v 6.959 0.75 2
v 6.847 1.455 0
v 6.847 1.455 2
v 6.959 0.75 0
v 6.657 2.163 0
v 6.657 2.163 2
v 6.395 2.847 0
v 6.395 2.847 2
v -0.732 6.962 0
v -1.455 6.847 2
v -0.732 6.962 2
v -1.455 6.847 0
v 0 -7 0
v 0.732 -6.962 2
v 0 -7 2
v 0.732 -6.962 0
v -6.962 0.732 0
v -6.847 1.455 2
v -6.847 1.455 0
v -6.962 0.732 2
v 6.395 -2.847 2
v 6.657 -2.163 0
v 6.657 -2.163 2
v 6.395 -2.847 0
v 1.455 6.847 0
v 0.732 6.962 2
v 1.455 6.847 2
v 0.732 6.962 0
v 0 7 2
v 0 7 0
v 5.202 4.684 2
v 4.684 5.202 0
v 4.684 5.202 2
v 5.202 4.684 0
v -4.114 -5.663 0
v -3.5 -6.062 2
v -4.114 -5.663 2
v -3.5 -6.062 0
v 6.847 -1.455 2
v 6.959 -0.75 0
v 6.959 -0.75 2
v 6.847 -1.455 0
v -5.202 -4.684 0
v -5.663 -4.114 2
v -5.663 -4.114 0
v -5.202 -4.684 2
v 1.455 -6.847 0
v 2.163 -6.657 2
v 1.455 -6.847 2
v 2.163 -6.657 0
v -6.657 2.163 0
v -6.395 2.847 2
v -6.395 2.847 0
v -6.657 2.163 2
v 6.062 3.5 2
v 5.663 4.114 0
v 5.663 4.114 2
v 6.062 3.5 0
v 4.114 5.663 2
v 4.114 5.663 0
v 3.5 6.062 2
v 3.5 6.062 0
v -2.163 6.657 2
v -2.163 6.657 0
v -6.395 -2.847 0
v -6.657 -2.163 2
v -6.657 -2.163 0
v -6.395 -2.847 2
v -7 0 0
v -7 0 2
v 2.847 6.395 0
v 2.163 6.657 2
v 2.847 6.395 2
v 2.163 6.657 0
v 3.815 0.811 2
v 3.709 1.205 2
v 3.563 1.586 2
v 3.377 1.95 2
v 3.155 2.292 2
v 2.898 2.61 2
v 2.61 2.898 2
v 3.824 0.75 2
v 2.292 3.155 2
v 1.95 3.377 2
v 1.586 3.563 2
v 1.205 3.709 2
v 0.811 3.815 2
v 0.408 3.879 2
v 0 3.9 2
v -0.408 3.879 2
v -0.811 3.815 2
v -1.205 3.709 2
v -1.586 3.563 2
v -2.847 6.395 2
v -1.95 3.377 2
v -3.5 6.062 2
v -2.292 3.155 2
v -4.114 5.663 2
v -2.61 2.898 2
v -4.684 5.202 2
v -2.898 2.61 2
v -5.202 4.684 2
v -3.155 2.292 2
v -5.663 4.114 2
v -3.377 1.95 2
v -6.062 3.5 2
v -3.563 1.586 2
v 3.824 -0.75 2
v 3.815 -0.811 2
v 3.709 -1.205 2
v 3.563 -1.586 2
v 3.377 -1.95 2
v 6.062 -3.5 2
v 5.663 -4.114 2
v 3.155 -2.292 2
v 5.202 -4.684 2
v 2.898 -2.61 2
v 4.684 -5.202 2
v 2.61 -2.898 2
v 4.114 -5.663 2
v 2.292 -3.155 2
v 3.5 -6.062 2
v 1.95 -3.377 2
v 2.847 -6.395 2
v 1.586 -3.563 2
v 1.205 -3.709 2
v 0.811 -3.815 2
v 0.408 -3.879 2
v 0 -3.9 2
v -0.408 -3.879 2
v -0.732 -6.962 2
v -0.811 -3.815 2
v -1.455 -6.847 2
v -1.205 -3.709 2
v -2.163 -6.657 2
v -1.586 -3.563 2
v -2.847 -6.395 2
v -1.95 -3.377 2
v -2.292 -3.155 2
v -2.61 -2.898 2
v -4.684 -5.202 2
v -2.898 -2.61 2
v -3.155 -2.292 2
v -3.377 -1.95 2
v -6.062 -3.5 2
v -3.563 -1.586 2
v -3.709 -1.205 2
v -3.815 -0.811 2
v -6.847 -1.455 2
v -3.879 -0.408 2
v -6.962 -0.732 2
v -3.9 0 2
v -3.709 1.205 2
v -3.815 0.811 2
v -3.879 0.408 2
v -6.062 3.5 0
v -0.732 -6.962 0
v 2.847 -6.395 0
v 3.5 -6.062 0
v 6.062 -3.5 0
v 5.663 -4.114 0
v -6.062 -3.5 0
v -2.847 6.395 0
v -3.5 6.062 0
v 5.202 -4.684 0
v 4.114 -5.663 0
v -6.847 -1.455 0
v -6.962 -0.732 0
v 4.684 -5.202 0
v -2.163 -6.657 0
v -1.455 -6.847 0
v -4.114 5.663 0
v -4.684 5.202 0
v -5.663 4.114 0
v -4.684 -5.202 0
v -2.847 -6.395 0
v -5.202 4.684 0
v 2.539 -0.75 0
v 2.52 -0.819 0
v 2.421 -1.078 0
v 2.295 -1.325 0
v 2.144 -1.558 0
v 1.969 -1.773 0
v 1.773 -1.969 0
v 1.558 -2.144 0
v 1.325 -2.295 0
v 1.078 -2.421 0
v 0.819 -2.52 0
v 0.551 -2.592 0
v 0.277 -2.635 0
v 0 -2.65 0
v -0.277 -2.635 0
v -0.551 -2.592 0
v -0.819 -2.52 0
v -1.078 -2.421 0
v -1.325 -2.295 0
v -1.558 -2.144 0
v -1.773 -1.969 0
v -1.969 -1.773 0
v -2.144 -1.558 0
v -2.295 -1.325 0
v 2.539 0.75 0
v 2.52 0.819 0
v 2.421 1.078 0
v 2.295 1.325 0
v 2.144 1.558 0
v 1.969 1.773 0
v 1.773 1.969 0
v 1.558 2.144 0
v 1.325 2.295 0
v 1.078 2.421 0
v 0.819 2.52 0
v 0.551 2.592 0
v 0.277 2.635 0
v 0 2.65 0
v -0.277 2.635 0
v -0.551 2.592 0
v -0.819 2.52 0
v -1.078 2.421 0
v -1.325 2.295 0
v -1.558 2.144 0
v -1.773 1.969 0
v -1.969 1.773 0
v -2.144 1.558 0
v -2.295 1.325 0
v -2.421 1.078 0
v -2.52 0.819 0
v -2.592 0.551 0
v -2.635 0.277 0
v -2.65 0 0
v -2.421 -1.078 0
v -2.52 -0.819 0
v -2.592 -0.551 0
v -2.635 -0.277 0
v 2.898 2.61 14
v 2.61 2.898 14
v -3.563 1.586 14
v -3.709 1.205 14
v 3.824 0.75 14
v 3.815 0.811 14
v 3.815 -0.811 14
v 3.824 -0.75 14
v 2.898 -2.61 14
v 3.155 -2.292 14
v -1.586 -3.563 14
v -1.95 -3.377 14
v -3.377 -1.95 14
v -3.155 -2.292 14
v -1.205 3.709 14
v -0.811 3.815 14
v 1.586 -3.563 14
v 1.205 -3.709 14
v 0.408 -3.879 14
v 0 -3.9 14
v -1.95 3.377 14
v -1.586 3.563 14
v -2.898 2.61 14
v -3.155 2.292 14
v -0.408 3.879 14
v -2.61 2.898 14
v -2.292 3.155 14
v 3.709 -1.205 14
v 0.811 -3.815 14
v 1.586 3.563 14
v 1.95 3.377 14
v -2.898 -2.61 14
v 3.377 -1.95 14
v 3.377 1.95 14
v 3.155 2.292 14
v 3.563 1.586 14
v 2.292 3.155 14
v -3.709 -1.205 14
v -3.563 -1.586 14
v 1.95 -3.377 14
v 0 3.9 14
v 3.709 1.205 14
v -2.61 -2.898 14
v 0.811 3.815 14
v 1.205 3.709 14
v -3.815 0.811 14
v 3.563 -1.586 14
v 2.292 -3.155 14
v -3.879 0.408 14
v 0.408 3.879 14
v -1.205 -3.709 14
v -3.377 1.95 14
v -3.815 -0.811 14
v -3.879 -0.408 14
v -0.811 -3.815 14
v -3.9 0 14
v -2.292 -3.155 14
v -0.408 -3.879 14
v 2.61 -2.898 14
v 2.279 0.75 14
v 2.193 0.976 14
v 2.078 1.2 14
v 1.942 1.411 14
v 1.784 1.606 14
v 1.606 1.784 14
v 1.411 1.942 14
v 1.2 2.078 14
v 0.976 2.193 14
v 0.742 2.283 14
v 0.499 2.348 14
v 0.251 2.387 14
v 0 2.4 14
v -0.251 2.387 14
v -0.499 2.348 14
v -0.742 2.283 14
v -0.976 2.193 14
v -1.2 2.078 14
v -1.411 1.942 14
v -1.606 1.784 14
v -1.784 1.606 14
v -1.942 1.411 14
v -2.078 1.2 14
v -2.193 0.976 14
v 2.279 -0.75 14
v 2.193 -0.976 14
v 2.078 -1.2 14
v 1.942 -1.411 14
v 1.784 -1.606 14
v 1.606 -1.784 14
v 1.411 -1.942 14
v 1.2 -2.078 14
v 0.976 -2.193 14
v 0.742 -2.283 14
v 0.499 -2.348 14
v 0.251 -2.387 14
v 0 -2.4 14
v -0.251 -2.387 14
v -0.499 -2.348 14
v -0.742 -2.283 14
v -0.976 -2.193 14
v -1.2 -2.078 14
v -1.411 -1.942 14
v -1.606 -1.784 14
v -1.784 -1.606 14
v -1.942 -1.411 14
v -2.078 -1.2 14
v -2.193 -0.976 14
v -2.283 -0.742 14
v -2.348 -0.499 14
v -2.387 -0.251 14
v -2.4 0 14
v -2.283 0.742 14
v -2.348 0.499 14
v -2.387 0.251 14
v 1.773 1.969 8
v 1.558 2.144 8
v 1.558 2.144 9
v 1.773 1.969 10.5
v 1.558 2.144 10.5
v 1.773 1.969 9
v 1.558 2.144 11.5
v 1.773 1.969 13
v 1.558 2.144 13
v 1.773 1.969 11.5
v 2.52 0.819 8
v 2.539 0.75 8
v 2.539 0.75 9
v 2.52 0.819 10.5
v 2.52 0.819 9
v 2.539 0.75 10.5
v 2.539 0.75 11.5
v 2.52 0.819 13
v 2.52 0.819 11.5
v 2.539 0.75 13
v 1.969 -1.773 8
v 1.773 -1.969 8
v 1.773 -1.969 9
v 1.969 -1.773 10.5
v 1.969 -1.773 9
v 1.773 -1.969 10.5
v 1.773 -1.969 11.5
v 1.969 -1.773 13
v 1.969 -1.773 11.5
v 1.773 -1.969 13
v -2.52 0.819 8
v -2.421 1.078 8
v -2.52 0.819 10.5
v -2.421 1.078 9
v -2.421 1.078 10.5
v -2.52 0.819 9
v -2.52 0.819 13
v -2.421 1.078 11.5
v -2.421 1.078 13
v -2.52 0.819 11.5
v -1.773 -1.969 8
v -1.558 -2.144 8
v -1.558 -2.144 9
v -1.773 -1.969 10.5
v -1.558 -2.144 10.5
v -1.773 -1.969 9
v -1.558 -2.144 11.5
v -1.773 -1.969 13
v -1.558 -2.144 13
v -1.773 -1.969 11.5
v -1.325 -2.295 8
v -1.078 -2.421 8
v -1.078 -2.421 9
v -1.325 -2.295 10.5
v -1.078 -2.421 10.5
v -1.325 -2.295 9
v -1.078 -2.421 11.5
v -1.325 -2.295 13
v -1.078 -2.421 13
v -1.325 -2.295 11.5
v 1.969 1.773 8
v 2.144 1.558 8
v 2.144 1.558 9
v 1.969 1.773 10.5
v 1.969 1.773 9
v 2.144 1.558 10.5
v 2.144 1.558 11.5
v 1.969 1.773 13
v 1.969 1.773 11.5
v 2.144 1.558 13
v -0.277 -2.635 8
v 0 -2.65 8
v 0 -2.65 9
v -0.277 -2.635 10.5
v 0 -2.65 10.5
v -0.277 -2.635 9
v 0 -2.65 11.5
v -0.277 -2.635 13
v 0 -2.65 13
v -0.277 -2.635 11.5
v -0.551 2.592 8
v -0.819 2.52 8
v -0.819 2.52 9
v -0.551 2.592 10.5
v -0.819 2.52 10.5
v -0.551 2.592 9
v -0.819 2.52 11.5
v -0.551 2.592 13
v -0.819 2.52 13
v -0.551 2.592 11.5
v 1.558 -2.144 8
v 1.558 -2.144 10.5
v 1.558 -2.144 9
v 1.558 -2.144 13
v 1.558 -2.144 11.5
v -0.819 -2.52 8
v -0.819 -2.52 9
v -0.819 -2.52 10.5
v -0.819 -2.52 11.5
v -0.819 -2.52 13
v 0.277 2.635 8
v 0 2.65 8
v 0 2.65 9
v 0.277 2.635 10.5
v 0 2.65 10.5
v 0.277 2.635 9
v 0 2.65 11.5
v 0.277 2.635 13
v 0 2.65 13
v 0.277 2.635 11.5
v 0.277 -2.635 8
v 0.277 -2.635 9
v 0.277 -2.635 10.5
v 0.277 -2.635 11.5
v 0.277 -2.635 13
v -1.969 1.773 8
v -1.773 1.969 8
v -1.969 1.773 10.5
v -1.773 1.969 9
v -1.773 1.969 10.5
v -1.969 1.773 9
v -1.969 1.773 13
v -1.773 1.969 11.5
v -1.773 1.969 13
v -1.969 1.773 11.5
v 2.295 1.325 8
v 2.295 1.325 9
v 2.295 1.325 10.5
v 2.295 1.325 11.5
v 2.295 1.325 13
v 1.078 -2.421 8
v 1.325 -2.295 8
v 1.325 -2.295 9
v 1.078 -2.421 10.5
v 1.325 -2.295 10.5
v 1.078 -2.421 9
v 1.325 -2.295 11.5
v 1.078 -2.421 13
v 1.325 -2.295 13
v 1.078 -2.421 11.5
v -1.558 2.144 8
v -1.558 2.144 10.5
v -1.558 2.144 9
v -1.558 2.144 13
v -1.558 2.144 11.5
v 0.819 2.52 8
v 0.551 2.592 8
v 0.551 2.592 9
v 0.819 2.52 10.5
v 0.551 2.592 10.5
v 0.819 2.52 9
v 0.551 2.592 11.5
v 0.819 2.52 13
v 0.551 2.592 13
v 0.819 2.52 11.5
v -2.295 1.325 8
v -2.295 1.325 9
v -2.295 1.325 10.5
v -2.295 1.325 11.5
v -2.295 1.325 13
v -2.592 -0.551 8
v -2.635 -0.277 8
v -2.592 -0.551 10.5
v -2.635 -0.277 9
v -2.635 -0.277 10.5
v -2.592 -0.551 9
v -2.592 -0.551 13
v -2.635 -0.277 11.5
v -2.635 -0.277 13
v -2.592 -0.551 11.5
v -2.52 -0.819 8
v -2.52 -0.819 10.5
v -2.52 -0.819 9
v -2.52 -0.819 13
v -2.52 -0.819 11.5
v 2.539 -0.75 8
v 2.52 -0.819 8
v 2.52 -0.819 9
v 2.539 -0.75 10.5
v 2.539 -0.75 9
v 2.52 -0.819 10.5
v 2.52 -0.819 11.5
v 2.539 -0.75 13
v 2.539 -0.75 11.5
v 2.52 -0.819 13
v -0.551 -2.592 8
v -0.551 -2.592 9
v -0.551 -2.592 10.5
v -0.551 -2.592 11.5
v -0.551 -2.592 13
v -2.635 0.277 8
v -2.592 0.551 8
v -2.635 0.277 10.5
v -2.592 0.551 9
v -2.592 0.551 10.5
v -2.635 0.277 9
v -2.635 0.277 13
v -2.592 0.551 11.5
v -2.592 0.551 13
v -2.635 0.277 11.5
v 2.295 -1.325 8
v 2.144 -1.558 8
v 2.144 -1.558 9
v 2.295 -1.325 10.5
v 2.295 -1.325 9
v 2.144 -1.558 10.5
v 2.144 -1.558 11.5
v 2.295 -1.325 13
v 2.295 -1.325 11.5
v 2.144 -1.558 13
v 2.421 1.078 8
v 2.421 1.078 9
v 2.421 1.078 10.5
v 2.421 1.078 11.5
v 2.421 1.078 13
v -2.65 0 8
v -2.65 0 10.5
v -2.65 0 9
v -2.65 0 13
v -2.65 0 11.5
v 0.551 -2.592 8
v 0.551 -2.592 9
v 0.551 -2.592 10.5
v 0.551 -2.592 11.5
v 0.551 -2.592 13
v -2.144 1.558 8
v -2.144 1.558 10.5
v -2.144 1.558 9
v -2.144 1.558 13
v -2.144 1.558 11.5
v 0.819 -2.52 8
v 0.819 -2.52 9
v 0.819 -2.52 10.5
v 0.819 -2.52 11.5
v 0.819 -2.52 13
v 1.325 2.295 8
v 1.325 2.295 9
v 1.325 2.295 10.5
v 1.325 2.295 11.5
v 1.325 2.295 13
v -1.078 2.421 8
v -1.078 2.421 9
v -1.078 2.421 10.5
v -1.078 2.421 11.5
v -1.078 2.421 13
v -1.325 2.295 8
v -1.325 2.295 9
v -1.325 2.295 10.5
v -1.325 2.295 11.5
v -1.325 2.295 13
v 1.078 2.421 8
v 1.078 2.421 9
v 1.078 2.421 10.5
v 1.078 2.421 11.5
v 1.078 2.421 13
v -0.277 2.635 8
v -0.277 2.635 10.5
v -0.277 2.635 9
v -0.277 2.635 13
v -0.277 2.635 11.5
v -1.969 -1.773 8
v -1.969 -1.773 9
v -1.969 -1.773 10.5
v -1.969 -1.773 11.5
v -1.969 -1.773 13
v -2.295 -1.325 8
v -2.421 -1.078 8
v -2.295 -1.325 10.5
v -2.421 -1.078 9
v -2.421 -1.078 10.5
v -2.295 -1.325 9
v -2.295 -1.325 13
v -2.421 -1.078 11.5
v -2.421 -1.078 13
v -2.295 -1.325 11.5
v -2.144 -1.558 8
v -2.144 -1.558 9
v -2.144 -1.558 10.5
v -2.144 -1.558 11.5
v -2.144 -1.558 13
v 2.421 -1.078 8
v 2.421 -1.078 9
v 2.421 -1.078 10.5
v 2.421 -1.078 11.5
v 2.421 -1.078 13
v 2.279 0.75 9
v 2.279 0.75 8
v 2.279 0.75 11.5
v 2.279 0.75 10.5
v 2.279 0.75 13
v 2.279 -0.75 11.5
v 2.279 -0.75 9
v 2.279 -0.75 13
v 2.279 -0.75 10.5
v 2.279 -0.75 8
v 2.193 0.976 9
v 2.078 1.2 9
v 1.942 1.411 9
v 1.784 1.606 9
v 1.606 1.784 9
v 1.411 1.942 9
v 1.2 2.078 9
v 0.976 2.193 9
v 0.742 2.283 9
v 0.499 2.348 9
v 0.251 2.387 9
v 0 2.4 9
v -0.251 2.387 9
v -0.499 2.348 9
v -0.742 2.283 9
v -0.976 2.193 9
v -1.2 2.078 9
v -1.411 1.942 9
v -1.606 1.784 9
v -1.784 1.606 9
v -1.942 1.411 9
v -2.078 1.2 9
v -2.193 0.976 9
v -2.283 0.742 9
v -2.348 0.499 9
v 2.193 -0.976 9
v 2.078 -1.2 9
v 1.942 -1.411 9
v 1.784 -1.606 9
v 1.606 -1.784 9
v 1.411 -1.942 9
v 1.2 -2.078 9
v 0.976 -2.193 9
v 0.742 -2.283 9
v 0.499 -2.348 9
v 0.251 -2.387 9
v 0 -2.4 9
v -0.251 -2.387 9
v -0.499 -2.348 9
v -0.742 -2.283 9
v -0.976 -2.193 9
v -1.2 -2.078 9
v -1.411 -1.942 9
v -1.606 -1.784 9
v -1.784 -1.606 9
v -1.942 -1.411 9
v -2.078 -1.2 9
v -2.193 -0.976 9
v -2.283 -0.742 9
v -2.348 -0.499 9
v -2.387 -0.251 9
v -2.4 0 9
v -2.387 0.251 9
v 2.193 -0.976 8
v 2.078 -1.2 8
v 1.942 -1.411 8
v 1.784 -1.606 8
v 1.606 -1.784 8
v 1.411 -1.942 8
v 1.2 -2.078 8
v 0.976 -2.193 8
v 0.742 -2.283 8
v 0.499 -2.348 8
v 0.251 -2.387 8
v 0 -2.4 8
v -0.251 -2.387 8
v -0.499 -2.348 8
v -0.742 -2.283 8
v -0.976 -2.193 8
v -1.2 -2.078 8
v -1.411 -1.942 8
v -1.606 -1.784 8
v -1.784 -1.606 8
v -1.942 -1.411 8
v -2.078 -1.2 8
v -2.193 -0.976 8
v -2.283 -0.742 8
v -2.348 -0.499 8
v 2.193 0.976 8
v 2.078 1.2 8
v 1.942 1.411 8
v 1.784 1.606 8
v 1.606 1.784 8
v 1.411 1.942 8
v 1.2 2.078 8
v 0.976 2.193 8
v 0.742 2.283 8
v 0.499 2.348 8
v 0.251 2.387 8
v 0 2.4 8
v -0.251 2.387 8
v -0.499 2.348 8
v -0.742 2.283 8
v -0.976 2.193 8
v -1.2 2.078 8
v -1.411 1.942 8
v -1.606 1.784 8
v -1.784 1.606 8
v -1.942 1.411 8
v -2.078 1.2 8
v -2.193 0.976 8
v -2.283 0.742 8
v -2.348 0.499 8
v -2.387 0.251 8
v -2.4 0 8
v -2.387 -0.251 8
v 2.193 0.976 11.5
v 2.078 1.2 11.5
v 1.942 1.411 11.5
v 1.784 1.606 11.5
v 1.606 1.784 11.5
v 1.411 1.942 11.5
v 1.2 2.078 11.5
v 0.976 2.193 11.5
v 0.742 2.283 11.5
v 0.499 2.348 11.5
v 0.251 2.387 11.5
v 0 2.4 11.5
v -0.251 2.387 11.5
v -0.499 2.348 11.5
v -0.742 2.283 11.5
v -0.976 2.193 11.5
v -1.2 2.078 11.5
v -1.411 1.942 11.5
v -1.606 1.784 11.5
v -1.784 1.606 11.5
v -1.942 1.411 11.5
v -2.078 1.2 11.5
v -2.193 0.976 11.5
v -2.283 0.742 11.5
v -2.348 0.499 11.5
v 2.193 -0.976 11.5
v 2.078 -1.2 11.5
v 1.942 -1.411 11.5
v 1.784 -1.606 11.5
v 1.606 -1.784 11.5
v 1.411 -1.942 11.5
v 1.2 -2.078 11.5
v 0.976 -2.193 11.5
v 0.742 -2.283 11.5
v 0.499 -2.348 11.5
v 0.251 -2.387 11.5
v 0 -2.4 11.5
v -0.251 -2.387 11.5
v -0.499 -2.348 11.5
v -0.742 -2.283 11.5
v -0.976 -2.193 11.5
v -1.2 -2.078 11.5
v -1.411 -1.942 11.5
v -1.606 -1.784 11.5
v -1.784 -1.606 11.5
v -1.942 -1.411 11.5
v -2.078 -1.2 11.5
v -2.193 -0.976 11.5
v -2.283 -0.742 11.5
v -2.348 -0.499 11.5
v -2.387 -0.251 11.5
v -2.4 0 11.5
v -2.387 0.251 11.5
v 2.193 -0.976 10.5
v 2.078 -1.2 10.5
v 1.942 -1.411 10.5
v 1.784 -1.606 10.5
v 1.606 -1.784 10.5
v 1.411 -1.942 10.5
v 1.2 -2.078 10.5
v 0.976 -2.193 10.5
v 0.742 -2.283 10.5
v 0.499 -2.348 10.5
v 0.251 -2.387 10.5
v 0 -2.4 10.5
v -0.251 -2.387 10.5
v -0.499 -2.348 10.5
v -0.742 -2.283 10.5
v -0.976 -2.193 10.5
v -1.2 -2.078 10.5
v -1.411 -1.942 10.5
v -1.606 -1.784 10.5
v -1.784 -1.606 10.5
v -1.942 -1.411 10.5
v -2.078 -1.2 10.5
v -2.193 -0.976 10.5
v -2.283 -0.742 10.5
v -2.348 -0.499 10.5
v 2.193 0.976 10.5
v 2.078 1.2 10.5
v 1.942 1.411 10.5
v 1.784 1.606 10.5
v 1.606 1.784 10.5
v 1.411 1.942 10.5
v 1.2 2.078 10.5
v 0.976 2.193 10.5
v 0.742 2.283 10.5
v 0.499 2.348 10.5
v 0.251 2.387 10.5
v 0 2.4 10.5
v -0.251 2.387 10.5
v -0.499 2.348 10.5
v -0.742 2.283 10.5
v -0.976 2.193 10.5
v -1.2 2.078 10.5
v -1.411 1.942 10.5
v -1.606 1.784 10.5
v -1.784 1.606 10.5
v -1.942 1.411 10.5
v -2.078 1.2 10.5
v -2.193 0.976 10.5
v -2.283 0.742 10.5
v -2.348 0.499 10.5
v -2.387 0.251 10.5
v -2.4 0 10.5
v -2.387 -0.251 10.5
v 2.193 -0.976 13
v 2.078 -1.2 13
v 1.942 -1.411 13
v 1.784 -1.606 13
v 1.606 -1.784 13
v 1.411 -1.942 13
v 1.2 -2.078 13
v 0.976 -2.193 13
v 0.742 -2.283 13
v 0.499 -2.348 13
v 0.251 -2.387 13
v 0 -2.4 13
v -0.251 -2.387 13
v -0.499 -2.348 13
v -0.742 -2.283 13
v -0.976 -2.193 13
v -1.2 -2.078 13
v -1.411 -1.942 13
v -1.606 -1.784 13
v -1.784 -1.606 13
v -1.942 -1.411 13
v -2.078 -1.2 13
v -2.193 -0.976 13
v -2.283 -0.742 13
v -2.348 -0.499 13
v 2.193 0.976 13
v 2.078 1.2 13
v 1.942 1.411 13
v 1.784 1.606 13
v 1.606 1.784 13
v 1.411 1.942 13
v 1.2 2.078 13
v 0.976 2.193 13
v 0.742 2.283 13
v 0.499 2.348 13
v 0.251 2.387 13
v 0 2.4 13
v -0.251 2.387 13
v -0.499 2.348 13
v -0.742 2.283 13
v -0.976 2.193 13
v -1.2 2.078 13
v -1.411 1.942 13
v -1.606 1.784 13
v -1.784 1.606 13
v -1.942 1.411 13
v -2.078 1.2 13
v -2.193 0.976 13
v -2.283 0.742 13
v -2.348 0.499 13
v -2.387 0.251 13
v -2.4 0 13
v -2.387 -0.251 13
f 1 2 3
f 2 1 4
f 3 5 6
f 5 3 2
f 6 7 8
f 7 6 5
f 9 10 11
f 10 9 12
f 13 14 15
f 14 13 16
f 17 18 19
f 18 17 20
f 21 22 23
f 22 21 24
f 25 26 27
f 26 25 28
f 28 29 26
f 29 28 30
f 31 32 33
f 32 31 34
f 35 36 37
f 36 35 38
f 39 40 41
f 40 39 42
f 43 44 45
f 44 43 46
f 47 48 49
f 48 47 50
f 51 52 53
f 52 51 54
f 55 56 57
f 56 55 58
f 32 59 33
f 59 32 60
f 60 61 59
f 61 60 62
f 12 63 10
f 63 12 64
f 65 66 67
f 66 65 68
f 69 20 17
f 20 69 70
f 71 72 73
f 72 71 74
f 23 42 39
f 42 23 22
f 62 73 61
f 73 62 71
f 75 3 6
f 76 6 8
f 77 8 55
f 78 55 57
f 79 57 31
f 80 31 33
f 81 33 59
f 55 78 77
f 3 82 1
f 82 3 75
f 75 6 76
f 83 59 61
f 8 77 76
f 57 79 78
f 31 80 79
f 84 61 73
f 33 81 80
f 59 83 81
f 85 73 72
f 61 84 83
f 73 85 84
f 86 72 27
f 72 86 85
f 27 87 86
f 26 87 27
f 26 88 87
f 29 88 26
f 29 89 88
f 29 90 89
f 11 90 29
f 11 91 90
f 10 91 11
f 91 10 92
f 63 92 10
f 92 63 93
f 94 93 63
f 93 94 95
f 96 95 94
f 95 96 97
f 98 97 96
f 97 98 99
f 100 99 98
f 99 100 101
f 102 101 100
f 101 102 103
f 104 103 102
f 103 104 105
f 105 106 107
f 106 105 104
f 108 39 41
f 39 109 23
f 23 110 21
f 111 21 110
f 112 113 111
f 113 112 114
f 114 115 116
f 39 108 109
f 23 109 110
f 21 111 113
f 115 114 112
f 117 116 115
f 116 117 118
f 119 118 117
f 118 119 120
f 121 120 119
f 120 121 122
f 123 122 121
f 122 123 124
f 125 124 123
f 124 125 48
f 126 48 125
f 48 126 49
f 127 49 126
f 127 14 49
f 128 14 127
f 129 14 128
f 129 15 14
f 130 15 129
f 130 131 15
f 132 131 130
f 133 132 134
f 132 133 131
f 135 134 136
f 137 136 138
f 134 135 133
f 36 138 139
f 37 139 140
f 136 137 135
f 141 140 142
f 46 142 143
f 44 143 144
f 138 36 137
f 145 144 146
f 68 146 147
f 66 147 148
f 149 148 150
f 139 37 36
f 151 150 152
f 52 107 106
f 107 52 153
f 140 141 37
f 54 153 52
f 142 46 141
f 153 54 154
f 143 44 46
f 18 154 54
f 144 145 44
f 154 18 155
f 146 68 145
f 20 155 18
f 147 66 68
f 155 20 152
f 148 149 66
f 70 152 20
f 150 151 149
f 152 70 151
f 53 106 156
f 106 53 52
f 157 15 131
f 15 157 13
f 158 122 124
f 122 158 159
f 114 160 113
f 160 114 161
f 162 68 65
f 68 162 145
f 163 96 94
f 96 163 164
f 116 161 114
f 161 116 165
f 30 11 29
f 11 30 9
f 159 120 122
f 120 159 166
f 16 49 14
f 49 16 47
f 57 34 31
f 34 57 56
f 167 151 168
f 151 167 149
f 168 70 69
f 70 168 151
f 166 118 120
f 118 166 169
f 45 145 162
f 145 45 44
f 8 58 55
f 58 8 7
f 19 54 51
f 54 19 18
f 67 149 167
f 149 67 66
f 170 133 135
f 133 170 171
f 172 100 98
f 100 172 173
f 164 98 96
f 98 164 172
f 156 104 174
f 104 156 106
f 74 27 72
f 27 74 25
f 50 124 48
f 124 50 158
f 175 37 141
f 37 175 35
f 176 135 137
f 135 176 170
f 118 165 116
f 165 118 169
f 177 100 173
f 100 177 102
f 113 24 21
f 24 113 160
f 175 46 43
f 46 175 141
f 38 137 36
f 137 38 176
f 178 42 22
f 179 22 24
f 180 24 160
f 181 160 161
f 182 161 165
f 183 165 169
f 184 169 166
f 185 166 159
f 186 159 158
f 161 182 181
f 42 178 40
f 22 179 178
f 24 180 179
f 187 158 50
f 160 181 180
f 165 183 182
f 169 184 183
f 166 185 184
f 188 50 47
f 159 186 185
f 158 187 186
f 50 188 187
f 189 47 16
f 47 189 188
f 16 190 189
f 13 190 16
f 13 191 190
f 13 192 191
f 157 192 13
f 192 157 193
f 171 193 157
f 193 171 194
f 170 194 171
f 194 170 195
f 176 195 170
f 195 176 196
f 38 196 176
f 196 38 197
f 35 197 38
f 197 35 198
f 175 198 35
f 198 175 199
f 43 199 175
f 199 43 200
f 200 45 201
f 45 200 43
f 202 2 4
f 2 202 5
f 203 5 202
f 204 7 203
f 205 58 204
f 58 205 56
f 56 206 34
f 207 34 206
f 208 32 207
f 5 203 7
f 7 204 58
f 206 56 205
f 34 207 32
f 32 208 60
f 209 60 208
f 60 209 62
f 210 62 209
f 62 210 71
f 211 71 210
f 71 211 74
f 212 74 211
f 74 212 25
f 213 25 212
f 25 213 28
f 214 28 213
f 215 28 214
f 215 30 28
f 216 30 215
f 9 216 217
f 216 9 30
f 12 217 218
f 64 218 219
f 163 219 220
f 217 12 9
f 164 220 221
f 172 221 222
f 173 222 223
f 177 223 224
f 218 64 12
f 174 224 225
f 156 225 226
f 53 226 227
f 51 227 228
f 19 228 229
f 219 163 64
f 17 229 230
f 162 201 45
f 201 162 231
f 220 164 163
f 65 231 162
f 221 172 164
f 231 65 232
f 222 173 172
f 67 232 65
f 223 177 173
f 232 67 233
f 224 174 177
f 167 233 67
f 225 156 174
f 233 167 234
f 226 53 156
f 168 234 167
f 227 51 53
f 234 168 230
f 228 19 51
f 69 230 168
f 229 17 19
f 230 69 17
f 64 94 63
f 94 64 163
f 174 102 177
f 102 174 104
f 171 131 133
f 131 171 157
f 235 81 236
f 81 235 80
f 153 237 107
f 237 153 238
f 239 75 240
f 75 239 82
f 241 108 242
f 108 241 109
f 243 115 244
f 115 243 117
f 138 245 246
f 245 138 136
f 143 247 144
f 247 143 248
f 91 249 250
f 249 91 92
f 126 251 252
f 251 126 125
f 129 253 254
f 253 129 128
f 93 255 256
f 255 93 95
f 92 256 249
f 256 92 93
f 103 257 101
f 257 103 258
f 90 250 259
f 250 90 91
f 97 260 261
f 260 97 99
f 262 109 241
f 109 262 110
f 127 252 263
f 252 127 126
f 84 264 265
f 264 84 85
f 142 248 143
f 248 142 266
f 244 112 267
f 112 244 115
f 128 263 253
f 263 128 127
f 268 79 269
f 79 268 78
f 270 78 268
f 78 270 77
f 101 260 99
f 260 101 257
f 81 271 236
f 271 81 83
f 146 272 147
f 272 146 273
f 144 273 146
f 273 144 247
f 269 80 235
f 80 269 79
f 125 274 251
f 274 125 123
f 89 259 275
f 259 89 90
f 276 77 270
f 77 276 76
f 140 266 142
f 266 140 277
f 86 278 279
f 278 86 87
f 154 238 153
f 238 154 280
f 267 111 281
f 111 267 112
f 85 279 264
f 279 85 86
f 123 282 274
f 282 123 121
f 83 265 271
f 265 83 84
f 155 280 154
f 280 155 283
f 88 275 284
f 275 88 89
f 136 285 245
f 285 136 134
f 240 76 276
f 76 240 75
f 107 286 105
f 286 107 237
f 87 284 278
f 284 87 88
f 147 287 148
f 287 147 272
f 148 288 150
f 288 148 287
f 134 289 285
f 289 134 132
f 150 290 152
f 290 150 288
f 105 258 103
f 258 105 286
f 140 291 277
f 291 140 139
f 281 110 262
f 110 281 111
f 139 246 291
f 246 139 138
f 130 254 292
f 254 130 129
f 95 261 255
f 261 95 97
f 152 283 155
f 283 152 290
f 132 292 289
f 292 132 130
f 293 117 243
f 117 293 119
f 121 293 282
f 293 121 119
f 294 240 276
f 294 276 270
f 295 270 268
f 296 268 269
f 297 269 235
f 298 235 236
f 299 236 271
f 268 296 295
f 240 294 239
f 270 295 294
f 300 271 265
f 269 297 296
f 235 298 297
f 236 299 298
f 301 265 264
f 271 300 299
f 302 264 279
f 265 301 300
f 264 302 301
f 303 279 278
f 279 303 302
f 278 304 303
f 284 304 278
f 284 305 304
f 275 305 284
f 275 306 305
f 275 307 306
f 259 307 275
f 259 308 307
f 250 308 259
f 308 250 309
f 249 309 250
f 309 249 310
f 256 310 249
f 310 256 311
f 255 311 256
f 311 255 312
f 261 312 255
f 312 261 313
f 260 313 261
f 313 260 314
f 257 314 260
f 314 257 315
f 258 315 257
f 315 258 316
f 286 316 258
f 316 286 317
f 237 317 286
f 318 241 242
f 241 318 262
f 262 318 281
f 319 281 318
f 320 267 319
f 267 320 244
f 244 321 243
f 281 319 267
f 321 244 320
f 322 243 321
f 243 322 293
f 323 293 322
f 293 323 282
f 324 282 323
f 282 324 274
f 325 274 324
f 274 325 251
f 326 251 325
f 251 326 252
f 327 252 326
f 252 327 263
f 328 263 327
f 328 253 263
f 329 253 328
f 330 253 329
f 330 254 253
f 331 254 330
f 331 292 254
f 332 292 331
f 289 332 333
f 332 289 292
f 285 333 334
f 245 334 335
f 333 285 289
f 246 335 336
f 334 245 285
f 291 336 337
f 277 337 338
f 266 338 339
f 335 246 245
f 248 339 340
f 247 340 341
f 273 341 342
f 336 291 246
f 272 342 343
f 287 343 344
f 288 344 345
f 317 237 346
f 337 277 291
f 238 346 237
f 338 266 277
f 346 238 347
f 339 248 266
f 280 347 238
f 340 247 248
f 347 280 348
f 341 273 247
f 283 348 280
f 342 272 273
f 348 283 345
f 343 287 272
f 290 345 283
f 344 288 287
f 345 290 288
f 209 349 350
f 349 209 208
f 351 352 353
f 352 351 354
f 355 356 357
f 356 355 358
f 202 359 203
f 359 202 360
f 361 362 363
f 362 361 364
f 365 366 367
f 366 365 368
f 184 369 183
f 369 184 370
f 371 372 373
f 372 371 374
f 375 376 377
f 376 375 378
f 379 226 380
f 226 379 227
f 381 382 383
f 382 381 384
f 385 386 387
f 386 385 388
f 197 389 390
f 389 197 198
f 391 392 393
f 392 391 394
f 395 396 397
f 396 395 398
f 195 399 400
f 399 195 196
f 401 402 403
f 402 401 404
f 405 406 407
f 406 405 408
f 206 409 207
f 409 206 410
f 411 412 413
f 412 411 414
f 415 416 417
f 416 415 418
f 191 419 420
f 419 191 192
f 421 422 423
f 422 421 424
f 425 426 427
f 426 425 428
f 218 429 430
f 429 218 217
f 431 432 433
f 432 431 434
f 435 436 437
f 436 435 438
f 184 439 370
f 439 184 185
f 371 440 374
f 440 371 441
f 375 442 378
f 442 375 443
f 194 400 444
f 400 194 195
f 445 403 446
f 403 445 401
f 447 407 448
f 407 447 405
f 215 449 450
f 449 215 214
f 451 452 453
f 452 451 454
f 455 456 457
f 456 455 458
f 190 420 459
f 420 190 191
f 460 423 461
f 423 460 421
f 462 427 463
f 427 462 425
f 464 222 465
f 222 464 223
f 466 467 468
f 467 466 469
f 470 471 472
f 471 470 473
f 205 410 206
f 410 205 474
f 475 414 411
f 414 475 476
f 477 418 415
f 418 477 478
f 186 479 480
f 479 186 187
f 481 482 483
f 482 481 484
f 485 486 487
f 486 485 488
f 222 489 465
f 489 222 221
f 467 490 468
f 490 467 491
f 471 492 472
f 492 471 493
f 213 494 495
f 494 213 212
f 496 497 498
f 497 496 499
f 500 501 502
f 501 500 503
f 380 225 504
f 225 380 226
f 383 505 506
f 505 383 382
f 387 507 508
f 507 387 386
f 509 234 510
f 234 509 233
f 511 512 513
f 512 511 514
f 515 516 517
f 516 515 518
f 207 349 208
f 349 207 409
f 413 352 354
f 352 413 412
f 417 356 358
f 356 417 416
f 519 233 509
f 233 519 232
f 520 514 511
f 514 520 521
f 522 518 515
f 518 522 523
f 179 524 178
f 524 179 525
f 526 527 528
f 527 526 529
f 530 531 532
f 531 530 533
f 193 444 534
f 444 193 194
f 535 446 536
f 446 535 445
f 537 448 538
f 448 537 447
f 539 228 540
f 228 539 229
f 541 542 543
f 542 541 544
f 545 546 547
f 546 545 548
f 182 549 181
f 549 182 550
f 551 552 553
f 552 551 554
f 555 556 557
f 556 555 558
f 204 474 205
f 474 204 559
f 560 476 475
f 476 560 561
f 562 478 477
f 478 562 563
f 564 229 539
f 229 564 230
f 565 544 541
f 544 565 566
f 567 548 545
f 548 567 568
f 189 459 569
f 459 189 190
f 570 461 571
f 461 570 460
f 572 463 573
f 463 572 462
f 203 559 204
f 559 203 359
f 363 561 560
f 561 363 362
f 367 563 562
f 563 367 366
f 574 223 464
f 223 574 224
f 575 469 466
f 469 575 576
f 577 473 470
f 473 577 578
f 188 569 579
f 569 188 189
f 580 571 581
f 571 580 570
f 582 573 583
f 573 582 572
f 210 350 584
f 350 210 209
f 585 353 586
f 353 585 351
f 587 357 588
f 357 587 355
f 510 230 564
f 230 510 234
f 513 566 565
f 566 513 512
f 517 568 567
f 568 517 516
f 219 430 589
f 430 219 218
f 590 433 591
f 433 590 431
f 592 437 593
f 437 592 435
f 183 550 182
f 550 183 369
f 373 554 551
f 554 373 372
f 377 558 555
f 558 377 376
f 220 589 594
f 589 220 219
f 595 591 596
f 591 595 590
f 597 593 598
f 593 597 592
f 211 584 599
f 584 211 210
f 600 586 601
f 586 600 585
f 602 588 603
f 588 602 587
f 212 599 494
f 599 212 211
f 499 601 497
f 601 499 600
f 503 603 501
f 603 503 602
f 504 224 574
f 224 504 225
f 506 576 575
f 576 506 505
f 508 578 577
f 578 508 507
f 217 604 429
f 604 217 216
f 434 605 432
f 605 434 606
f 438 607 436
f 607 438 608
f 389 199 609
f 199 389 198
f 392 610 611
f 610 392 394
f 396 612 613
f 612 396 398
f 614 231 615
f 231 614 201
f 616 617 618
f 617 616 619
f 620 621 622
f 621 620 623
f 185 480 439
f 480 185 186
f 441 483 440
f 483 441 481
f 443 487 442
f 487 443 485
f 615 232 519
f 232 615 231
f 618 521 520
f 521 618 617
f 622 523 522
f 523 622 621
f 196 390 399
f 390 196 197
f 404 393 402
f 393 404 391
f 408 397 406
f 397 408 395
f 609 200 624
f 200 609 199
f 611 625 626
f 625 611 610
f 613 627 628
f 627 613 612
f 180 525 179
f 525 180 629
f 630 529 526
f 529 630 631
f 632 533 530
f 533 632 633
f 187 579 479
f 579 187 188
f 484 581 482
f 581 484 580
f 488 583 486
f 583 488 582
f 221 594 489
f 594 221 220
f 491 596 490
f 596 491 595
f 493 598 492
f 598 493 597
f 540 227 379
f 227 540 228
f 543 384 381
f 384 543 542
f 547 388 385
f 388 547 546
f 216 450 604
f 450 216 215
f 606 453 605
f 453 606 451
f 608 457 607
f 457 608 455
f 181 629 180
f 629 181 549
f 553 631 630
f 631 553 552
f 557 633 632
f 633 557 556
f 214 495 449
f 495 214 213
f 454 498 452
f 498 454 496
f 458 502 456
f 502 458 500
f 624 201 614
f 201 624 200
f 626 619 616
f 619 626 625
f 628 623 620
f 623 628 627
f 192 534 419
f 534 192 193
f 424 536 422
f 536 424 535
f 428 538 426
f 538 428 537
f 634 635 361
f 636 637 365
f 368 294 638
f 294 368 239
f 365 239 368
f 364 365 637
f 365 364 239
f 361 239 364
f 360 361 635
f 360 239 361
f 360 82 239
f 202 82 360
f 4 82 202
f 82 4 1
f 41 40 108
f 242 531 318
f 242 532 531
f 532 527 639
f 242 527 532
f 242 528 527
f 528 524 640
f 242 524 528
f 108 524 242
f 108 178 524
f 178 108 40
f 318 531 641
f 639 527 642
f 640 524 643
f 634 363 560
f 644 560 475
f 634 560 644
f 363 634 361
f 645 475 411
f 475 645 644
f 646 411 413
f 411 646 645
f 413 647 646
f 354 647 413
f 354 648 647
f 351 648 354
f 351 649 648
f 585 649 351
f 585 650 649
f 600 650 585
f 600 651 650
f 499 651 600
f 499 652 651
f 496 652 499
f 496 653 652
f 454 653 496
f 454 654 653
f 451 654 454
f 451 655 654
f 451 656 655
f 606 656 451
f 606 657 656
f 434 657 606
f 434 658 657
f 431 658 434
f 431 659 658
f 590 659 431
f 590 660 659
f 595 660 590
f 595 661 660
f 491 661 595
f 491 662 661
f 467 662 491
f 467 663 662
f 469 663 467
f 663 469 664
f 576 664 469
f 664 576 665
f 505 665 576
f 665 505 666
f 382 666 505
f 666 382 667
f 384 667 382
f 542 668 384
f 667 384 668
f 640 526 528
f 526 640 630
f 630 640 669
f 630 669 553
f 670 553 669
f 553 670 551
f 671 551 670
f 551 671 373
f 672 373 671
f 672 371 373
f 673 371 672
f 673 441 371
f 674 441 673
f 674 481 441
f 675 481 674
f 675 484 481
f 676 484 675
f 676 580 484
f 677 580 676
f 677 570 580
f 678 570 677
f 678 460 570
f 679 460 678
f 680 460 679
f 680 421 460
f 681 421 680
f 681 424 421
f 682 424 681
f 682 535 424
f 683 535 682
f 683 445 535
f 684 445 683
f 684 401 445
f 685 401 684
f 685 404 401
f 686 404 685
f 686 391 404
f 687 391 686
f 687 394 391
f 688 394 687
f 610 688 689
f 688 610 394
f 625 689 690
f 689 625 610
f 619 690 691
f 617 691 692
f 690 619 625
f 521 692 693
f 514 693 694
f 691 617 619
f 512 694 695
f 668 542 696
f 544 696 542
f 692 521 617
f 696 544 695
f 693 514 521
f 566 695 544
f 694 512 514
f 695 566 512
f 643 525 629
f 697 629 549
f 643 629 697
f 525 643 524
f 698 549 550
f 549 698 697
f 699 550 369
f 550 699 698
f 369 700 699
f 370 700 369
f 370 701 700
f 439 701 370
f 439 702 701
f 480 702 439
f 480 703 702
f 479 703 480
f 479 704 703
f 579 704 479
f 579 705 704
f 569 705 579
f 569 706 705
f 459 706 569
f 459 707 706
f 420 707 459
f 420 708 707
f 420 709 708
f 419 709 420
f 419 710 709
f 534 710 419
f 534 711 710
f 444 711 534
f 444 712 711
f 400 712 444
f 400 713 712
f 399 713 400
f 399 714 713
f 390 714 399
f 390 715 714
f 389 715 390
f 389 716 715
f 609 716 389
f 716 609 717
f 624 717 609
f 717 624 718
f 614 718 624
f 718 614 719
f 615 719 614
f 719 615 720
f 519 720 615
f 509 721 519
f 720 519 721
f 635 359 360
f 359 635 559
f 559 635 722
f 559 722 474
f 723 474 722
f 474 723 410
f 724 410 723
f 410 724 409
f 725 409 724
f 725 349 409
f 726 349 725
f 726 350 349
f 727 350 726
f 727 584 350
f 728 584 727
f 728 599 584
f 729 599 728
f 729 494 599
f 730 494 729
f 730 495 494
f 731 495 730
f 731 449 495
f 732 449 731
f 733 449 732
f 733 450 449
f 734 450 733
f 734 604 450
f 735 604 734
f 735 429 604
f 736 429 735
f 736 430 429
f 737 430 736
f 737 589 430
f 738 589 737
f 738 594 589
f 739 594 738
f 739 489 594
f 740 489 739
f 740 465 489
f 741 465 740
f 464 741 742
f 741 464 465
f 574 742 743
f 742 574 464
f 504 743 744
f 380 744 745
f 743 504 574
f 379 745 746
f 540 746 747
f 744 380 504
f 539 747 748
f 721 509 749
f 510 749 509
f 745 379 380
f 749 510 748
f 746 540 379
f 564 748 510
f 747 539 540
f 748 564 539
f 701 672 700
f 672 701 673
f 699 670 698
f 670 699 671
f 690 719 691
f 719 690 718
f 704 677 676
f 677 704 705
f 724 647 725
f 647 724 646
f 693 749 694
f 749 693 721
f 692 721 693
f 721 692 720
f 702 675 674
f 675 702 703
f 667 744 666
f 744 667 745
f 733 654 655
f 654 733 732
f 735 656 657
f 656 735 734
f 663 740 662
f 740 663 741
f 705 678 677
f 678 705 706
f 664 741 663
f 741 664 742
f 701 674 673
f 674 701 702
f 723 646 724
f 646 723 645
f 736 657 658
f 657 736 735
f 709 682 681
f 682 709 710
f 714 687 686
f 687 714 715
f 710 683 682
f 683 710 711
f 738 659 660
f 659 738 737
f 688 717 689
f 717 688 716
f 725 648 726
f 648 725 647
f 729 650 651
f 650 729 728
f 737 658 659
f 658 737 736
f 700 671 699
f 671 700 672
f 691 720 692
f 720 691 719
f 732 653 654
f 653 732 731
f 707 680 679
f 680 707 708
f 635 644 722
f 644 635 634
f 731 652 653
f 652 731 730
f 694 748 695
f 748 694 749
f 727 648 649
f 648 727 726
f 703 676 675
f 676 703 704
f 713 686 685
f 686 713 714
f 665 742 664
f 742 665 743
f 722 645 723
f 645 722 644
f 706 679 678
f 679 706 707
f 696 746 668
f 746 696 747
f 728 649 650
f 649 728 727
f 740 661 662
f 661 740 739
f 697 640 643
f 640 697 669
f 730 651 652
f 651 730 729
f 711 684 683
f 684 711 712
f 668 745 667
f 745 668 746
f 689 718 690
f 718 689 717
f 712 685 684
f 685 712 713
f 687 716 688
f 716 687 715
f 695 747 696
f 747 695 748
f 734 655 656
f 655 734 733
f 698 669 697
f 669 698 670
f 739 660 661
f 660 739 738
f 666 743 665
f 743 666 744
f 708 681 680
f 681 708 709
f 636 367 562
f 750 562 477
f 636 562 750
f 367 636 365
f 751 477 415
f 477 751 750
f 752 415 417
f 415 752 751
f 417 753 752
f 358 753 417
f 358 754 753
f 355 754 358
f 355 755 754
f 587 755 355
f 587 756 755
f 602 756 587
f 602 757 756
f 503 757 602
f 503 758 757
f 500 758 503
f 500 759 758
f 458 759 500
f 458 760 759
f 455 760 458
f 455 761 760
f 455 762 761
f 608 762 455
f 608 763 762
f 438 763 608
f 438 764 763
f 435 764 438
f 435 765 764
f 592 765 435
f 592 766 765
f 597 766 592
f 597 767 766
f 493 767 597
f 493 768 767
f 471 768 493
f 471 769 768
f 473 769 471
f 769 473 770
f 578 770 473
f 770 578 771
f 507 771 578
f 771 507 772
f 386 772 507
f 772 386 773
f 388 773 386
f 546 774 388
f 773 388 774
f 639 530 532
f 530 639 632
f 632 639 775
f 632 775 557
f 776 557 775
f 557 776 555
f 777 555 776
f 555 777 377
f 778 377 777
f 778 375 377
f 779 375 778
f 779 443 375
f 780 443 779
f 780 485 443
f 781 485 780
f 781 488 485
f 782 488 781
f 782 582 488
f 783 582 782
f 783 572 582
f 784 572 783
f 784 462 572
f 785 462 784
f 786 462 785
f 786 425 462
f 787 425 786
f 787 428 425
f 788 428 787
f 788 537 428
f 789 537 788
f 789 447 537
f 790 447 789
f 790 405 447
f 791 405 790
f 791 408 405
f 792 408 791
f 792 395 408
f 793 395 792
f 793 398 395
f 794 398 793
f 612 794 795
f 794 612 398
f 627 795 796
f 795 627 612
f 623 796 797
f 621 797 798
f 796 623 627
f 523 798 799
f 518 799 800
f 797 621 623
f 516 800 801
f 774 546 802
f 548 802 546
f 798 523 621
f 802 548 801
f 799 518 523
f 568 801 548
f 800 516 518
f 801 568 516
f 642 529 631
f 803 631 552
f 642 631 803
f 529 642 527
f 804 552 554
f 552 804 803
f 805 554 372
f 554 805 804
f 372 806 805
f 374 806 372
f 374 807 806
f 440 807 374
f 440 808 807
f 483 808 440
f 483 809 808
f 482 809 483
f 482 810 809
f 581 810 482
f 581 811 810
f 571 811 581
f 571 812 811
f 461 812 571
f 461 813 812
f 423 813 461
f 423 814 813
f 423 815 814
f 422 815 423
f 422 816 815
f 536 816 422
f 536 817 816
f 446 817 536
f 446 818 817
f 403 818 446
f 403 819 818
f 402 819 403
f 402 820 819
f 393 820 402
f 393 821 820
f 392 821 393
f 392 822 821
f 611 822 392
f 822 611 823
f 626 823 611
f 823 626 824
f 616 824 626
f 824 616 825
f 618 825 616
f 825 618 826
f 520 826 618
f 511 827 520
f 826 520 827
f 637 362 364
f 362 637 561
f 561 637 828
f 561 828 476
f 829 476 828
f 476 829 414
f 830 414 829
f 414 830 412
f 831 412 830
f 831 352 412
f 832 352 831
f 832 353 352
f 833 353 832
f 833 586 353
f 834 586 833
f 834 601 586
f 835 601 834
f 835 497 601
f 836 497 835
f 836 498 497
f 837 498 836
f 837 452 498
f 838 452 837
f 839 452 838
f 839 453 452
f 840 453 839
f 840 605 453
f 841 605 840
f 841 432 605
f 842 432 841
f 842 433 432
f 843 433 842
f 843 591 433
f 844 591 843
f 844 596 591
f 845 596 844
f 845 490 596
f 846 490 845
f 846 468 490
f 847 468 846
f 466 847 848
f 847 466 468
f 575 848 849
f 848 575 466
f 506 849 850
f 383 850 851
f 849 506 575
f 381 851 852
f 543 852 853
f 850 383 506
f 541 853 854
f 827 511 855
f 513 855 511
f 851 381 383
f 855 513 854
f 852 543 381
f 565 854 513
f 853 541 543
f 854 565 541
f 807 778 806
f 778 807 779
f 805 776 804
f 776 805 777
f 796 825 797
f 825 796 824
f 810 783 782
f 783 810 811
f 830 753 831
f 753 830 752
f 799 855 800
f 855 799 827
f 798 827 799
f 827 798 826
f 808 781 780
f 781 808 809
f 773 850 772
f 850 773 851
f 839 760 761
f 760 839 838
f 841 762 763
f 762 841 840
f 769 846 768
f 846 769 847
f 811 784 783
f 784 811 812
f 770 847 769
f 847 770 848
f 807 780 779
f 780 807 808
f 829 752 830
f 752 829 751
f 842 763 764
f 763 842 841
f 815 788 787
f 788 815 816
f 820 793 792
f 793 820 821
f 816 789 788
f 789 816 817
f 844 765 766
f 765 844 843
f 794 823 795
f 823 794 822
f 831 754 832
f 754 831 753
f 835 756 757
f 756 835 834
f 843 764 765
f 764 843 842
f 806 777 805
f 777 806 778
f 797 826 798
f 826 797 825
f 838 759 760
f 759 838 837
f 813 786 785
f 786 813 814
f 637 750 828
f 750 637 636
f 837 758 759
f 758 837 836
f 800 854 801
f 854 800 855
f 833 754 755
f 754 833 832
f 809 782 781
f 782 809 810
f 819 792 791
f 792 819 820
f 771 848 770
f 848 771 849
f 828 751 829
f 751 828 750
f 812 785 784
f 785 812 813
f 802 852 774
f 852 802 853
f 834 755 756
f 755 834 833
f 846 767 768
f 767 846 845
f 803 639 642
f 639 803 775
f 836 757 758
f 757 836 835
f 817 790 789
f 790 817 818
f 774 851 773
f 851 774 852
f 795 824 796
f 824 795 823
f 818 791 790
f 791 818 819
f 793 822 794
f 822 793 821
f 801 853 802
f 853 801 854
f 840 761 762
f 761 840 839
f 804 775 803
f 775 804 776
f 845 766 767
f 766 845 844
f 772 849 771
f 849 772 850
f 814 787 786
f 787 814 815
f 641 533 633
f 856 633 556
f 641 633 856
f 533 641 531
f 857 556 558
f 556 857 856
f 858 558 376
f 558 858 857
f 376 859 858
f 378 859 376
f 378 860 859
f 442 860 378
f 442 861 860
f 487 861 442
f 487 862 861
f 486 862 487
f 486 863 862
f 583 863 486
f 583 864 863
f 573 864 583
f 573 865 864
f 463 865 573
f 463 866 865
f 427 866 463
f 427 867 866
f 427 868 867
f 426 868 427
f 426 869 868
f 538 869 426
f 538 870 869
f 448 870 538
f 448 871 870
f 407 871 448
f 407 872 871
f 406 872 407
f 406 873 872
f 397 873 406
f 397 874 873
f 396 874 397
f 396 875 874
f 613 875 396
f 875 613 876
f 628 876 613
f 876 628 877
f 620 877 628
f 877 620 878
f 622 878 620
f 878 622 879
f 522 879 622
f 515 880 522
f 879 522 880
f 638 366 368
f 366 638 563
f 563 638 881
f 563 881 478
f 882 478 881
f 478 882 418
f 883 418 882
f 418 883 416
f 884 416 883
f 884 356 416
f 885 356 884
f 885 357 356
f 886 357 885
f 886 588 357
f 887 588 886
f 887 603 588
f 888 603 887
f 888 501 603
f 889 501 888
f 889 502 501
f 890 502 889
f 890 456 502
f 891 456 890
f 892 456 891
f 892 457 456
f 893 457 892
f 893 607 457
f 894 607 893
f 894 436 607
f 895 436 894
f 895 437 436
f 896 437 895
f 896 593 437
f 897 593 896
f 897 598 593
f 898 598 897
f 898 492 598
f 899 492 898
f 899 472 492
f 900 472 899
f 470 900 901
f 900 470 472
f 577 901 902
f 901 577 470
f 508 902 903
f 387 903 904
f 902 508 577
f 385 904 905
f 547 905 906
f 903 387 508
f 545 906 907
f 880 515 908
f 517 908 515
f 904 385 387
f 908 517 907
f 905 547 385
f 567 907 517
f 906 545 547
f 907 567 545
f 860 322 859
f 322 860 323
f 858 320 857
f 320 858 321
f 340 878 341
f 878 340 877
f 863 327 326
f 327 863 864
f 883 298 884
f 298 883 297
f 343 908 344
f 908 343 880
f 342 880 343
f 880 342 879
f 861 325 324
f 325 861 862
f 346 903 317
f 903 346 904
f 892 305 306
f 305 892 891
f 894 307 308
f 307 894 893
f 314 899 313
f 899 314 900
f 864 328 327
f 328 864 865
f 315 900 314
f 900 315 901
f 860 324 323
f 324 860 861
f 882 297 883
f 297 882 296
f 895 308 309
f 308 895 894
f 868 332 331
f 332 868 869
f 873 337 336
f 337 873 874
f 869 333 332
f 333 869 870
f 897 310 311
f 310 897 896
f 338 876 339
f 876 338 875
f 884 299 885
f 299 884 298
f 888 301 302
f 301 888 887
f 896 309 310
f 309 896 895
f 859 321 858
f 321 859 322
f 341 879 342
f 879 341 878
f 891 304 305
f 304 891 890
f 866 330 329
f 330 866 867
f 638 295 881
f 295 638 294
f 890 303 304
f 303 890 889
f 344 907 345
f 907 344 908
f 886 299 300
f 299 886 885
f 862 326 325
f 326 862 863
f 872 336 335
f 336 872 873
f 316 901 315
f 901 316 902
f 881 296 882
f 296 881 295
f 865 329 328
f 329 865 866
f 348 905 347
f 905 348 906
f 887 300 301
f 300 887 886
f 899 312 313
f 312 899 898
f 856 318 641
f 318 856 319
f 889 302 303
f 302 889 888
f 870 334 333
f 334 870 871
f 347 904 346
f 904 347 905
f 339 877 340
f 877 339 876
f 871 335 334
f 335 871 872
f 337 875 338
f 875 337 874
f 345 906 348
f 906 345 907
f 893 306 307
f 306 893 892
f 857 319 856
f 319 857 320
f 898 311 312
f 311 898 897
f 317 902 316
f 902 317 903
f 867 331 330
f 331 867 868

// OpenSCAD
// Strain Relief Grommet
// Prints separately, snaps into cable holes

/* [Grommet Size] */
hole_dia = 8;          // Diameter of hole in enclosure
cable_dia = 5;         // Diameter of cable passing through
wall_thickness = 4;    // Enclosure wall thickness

/* [Grommet Design] */
flange_thickness = 2;  // Thickness of outer flange
flange_dia = 14;       // Diameter of outer flange
grip_length = 8;       // Length of strain relief grip section
slot_width = 1.5;      // Width of cable insertion slot

/* [Tolerances] */
hole_tolerance = 0.2;  // Clearance for hole fit
cable_tolerance = 0.3; // Clearance for cable

/* [Hidden] */
$fn = 60;

// Calculated
insert_dia = hole_dia - hole_tolerance;
cable_hole = cable_dia + cable_tolerance;

module grommet() {
    difference() {
        union() {
            // Outer flange (sits against outside of enclosure)
            cylinder(d=flange_dia, h=flange_thickness);

            // Insert section (goes through wall)
            translate([0, 0, flange_thickness])
                cylinder(d=insert_dia, h=wall_thickness);

            // Inner grip/strain relief section
            translate([0, 0, flange_thickness + wall_thickness])
                cylinder(d=insert_dia, h=grip_length);
        }

        // Cable hole through entire grommet
        translate([0, 0, -0.1])
            cylinder(d=cable_hole, h=flange_thickness + wall_thickness + grip_length + 0.2);

        // Slot for cable insertion (so you don't have to thread cable through)
        translate([0, -slot_width/2, -0.1])
            cube([flange_dia/2 + 1, slot_width, flange_thickness + wall_thickness + grip_length + 0.2]);
    }

    // Add grip ridges on inner section
    for (i = [0:2]) {
        translate([0, 0, flange_thickness + wall_thickness + 2 + i * 2.5])
            difference() {
                cylinder(d=insert_dia, h=1);
                translate([0, 0, -0.1])
                    cylinder(d=cable_hole - 0.5, h=1.2);
                // Keep the slot open through ridges
                translate([0, -slot_width/2, -0.1])
                    cube([flange_dia/2 + 1, slot_width, 1.2]);
            }
    }
}

// Render
grommet();

// Info
echo("Grommet for hole diameter:", hole_dia);
echo("Cable diameter:", cable_dia);
echo("Total length:", flange_thickness + wall_thickness + grip_length);
